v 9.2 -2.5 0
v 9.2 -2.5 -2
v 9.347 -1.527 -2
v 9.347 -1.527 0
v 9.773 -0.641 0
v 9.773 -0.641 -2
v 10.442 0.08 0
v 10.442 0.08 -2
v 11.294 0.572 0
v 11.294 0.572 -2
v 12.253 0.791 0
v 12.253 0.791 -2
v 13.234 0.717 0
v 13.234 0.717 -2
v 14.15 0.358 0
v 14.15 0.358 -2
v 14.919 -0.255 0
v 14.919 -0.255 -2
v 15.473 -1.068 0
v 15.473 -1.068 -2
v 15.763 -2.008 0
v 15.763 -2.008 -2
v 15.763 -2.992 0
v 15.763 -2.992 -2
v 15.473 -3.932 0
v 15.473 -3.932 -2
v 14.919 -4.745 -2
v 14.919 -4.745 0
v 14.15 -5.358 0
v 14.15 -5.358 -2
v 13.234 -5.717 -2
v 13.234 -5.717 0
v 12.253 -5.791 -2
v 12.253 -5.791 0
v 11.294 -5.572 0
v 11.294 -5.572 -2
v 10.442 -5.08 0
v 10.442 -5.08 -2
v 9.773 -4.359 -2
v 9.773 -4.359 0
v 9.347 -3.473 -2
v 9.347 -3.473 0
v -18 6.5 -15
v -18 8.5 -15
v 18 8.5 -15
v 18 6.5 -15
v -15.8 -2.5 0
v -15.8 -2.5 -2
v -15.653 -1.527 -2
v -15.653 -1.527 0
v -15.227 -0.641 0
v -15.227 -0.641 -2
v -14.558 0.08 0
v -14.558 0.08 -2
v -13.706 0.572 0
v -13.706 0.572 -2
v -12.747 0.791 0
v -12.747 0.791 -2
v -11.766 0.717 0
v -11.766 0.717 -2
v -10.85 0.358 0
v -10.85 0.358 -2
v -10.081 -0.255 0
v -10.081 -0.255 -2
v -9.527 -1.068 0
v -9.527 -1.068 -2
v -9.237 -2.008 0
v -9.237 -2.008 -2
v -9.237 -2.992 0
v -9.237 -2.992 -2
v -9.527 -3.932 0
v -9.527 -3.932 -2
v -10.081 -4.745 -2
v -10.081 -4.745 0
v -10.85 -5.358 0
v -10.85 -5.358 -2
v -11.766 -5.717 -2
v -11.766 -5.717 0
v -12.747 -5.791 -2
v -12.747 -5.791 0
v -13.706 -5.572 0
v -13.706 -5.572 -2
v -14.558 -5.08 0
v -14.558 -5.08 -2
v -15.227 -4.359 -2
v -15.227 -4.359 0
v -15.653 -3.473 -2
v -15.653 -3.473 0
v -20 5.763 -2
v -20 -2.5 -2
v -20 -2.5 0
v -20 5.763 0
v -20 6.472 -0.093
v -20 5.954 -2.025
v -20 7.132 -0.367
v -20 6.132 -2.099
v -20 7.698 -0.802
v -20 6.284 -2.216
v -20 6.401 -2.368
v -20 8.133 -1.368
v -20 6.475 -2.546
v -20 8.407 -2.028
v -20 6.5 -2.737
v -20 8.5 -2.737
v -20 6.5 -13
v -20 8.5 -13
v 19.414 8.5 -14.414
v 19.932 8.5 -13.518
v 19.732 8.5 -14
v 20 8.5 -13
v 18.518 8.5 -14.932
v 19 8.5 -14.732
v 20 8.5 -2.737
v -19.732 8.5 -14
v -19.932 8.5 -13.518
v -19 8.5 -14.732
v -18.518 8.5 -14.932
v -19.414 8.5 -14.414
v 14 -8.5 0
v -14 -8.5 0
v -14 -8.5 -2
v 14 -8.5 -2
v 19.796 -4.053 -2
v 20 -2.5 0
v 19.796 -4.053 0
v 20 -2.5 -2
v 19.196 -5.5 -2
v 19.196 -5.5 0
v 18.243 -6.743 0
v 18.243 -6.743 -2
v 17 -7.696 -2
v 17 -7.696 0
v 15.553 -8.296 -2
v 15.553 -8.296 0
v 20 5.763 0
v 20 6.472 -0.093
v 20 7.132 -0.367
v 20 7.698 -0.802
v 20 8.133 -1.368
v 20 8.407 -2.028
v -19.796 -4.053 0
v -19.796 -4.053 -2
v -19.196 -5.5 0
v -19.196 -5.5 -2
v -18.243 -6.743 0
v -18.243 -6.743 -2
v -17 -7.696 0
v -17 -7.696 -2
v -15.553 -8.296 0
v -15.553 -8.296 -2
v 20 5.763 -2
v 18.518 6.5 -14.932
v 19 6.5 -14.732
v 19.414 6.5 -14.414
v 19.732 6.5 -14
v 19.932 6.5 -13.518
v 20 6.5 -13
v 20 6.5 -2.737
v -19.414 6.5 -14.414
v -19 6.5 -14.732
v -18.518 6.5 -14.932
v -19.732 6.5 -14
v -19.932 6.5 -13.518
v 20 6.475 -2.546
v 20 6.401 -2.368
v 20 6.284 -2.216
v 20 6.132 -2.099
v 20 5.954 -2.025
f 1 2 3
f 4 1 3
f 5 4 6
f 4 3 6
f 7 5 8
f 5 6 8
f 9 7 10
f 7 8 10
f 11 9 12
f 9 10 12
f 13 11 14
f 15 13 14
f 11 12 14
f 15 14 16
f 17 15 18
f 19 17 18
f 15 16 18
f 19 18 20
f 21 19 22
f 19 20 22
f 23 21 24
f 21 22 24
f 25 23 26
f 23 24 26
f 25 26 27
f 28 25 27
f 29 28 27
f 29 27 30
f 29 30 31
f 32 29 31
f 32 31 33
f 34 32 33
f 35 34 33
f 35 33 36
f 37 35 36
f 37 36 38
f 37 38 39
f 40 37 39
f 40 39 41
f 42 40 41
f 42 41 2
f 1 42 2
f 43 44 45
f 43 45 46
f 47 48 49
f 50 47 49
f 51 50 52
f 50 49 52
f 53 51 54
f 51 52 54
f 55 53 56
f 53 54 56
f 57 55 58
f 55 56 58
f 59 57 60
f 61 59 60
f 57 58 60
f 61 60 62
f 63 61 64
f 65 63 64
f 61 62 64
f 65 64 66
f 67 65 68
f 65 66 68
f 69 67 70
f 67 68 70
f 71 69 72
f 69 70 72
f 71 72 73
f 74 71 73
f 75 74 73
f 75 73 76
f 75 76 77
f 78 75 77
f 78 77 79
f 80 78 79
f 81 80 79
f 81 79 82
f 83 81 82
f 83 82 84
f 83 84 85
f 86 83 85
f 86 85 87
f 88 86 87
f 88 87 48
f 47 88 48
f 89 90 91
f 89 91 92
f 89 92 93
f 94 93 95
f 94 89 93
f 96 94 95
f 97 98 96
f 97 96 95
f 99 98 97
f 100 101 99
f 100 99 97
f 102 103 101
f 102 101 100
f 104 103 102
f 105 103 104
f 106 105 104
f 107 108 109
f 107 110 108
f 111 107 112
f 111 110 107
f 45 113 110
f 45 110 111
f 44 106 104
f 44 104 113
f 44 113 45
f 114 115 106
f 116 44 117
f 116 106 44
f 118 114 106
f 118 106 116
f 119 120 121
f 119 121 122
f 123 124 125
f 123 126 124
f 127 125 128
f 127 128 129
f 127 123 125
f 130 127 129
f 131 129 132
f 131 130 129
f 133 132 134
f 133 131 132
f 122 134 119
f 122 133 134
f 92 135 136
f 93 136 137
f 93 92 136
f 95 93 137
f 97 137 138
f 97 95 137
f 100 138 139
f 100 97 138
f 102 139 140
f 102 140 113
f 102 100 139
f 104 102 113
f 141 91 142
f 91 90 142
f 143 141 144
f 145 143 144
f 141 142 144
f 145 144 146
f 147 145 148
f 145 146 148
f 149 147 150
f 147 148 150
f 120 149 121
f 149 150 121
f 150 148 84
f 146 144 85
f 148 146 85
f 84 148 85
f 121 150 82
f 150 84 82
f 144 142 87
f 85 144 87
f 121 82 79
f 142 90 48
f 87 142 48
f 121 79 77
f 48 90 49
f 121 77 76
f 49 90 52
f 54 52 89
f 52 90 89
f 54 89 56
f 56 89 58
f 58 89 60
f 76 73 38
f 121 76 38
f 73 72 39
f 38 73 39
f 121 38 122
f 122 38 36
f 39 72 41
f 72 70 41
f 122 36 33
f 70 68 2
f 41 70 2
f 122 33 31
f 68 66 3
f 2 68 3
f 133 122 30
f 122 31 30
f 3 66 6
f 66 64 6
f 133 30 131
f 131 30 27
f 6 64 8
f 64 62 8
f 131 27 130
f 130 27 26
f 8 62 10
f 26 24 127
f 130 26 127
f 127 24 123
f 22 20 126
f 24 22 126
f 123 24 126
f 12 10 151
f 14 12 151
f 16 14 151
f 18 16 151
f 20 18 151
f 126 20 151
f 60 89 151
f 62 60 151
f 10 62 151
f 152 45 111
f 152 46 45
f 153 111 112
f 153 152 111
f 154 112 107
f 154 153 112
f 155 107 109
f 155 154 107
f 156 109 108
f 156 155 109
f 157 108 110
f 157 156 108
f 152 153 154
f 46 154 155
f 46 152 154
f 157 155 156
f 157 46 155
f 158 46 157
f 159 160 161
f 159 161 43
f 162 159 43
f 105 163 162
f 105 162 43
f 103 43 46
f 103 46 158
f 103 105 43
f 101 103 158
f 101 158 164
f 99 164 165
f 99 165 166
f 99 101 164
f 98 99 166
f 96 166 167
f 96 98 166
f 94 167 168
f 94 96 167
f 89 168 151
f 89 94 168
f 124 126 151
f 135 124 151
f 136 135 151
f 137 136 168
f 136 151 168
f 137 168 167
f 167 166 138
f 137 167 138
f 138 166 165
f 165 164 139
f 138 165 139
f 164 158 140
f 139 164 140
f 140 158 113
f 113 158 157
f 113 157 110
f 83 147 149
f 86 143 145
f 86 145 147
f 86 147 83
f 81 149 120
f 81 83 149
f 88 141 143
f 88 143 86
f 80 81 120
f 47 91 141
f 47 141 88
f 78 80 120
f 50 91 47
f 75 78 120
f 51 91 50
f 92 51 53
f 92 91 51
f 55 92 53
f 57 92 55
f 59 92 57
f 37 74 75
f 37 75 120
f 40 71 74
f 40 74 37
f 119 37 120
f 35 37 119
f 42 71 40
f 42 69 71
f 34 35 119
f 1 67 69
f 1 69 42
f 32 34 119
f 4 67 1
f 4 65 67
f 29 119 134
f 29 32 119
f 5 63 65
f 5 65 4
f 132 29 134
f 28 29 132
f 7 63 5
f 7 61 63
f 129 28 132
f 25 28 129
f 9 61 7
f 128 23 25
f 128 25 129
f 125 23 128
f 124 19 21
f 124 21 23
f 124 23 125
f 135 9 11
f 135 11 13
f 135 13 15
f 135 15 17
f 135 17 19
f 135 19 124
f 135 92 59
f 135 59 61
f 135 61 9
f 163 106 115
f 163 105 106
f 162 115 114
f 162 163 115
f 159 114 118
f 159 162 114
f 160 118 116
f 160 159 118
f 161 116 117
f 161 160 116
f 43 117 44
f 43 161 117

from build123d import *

# Parameters (mm, degrees)
SKETCH_2_W                       = 40
SKETCH_2_H                       = 17
SM_BASE_FLANGE_1_DEPTH           = 2
SM_EDGE_FLANGE_1_STRIP_W         = 9.4732
SM_EDGE_FLANGE_1_STRIP_H         = 2
SM_EDGE_FLANGE_1_STRIP_CUT_DEPTH = 40
SM_EDGE_FLANGE_1_DEPTH           = 40
SKETCH_10_R                      = 3.3
CUT_EXTRUDE_1_DEPTH              = 10
FILLET_1_R                       = 6
FILLET_2_R                       = 2


# Sheet-metal steps are written as plain solids
with BuildPart() as part:
    # Sketch 2 → 基体-法兰1 (new body)
    with BuildSketch(Plane.XY):
        Rectangle(SKETCH_2_W, SKETCH_2_H)
    extrude(amount=-SM_BASE_FLANGE_1_DEPTH)

    # 边线-法兰1 strip (across the edge) → 边线-法兰1 strip cut (cut)
    with BuildSketch(Plane(origin=(-20, 8.5, -2), x_dir=(0, -1, 0), z_dir=(1, 0, 0))):
        with Locations((-2, -1)):
            Rectangle(SM_EDGE_FLANGE_1_STRIP_W, SM_EDGE_FLANGE_1_STRIP_H)
    extrude(amount=SM_EDGE_FLANGE_1_STRIP_CUT_DEPTH, mode=Mode.SUBTRACT)

    # 边线-法兰1 section (across the edge) → 边线-法兰1 (add)
    with BuildSketch(Plane(origin=(-20, 8.5, -2), x_dir=(0, -1, 0), z_dir=(1, 0, 0))):
        with BuildLine():
            Line((0, 0.7366), (0, 13))
            Line((0, 13), (2, 13))
            Line((2, 13), (2, 0.7366))
            ThreePointArc((2, 0.7366), (2.215745145, 0.215745145), (2.7366, 0))
            Line((2.7366, 0), (2.7366, -2))
            ThreePointArc((2.7366, -2), (0.801531583, -1.198468417), (0, 0.7366))
        make_face()
    extrude(amount=SM_EDGE_FLANGE_1_DEPTH)

    # 草图10 → 切除-拉伸1 (cut)
    with BuildSketch(Plane(origin=(0, 0, -2), x_dir=(-1, 0, 0), z_dir=(0, 0, -1))):
        with Locations((-12.5, -2.5)):
            Circle(SKETCH_10_R)
        with Locations((12.5, -2.5)):
            Circle(SKETCH_10_R)
    extrude(amount=-CUT_EXTRUDE_1_DEPTH, mode=Mode.SUBTRACT)

    # 圆角1
    fillet_1_edges = [part.edges().sort_by_distance(p)[0] for p in [
        (20, -8.5, -1),
        (-20, -8.5, -1),
    ]]
    fillet(fillet_1_edges, radius=FILLET_1_R)

    # 圆角2
    fillet_2_edges = [part.edges().sort_by_distance(p)[0] for p in [
        (-20, 7.5, -15),
        (20, 7.5, -15),
    ]]
    fillet(fillet_2_edges, radius=FILLET_2_R)


solid = part.part
